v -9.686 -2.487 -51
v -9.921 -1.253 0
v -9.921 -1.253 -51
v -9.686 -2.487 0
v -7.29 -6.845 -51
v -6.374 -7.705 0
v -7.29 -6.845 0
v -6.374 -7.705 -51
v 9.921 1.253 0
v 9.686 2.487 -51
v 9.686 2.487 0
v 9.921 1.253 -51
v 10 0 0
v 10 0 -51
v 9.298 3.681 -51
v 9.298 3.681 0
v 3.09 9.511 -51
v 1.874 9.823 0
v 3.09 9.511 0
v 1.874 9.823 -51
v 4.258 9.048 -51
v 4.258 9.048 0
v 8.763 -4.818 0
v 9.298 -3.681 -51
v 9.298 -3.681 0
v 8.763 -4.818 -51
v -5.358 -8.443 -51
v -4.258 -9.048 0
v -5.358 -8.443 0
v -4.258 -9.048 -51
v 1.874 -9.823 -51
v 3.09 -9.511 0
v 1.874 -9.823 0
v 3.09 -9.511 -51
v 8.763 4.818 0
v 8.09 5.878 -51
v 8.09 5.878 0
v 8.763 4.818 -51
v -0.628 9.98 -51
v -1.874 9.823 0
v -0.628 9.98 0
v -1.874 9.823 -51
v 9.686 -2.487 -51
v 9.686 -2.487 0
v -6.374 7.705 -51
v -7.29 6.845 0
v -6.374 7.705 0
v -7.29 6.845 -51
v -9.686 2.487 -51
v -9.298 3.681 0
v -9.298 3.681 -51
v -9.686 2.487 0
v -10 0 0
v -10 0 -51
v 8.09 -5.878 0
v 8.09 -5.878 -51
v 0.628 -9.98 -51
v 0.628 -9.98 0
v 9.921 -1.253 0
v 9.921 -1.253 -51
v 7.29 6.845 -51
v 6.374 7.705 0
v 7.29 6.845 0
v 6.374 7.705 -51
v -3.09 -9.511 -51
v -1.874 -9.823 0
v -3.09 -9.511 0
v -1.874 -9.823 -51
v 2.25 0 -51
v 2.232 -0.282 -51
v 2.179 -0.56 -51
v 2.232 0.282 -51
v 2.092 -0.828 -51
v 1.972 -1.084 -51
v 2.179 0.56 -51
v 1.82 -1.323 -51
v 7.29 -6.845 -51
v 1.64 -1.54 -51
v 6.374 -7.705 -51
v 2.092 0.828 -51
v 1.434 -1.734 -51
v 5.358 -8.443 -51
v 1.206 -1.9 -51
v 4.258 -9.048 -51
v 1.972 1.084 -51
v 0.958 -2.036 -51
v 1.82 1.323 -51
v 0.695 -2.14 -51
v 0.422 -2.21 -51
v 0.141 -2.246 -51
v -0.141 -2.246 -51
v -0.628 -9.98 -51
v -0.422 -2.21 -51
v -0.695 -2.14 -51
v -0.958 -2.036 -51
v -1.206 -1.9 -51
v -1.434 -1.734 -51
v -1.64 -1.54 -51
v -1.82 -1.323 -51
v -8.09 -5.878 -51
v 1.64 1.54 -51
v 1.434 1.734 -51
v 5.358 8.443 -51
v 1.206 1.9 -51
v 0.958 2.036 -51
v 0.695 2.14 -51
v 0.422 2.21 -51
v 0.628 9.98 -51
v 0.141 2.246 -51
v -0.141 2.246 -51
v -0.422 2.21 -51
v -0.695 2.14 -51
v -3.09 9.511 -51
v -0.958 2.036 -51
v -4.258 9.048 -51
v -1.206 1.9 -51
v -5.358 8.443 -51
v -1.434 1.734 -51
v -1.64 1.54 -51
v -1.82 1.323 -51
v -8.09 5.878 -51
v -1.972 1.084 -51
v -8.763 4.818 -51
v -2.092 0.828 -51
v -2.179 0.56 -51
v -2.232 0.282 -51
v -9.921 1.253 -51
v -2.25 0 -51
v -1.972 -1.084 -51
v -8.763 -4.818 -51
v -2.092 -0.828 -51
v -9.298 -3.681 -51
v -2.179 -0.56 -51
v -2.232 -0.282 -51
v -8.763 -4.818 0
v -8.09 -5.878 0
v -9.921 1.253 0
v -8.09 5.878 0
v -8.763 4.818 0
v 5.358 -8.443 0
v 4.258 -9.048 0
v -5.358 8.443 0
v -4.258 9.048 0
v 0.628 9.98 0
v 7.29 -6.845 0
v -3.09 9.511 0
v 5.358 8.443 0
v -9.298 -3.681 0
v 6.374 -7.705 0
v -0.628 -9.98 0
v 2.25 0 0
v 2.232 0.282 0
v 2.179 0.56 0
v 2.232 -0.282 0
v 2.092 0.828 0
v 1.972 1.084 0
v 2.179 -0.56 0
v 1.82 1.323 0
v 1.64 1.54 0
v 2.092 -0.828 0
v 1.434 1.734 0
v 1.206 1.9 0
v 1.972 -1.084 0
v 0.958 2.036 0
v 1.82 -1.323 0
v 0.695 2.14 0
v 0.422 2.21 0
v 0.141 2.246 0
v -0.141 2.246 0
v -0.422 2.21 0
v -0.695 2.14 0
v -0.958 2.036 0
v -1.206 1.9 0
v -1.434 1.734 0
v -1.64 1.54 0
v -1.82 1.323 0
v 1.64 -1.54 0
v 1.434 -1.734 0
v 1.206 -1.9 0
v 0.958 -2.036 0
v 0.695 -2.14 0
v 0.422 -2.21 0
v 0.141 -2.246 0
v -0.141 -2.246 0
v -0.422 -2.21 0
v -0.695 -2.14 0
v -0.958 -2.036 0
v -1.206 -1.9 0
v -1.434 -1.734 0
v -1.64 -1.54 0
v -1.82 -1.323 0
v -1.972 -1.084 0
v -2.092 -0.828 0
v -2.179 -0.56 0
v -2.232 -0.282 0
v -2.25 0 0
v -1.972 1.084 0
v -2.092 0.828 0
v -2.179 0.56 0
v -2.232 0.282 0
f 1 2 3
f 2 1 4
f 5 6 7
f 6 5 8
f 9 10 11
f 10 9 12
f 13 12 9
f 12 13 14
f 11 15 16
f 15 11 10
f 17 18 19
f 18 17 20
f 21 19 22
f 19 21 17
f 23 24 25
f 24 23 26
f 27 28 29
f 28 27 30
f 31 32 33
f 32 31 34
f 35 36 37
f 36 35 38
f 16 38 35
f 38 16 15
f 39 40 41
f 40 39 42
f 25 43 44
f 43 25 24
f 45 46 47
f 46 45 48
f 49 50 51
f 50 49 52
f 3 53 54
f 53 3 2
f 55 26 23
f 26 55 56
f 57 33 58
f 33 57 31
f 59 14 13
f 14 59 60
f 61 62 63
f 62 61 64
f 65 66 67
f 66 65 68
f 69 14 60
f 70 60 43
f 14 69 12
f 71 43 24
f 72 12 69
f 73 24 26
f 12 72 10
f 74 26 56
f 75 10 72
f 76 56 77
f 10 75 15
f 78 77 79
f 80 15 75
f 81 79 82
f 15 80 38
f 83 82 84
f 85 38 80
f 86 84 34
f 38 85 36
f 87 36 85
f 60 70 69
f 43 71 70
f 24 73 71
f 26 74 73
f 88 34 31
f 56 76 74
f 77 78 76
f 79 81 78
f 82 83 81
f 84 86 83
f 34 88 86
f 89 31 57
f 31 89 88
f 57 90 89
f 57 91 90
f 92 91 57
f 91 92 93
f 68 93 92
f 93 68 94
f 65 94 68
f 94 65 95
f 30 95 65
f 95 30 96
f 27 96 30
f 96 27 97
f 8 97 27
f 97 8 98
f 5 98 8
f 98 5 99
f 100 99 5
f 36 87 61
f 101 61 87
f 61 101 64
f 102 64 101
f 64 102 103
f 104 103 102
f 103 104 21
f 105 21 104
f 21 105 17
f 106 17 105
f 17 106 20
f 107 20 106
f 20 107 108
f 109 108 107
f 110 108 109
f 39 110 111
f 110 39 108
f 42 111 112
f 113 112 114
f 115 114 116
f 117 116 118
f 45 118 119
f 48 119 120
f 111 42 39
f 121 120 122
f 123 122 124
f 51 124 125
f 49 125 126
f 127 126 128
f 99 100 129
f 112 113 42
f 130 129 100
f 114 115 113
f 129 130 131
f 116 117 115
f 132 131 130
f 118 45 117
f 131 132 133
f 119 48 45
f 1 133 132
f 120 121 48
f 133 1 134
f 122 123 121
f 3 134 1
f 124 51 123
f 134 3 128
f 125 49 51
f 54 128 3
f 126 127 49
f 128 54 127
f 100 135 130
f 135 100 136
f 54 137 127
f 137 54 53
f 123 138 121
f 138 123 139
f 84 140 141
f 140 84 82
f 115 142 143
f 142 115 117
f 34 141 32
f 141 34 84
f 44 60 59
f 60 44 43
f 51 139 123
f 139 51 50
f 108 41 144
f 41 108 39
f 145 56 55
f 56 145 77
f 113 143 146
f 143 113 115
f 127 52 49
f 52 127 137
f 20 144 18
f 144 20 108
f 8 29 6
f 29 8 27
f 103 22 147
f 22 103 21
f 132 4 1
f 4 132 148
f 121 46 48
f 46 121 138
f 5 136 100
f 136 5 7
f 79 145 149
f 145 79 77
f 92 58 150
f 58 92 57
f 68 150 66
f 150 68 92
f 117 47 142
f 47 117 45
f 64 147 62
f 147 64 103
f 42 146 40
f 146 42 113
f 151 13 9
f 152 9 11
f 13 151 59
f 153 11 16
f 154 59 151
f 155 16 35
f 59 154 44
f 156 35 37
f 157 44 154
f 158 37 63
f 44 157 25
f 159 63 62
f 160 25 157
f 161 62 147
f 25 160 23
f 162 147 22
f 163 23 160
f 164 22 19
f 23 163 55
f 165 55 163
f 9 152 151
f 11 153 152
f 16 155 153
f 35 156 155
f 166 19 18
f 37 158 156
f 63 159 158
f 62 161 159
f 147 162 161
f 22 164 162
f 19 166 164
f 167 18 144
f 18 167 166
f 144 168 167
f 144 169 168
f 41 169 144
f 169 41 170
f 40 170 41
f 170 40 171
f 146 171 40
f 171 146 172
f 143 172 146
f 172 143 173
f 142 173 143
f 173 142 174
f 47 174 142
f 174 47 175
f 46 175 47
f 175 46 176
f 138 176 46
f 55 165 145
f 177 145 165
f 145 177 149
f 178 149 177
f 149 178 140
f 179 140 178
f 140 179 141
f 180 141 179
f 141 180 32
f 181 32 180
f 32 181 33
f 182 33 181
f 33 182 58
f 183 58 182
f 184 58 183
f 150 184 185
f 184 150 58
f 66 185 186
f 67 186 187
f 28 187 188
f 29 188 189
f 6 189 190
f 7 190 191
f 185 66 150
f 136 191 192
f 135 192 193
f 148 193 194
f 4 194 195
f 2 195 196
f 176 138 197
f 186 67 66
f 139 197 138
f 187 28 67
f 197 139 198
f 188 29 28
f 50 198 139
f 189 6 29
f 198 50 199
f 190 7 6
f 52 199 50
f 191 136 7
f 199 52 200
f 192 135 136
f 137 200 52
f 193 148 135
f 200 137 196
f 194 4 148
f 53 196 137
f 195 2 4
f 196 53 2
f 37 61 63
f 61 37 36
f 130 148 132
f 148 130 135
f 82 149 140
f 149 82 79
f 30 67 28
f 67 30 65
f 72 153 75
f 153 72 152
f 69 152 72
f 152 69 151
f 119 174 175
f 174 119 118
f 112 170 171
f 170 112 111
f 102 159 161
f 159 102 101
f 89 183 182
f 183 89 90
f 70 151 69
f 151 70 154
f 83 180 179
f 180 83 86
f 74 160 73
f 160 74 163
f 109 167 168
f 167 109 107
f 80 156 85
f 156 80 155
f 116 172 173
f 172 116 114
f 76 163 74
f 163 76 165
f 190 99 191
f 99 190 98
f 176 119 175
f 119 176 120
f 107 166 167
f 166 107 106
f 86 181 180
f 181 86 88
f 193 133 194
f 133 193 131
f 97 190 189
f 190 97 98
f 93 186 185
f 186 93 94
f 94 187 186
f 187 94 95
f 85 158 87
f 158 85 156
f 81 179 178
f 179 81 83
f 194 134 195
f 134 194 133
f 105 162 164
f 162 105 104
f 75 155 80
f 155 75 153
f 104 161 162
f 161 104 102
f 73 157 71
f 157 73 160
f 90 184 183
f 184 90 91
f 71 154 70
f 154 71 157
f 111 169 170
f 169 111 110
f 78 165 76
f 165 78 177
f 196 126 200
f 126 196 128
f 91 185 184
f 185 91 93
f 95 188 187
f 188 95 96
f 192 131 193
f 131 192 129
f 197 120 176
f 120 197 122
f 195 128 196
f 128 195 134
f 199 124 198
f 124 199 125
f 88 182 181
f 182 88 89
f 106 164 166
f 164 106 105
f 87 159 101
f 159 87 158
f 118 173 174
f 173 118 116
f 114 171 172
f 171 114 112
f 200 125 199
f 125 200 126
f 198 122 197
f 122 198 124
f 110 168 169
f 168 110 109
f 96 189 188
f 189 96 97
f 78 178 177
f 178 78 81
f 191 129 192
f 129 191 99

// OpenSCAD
$fn = 50;


difference() {
	union() {
		translate(v = [0, 0, -51.0000000000]) {
			cylinder(h = 51, r = 10.0000000000);
		}
		cylinder(h = 0, r = 16.0000000000);
	}
	union() {
		#translate(v = [0, 0, -51]) {
			cylinder(h = 51, r = 2.2500000000);
		}
	}
}
